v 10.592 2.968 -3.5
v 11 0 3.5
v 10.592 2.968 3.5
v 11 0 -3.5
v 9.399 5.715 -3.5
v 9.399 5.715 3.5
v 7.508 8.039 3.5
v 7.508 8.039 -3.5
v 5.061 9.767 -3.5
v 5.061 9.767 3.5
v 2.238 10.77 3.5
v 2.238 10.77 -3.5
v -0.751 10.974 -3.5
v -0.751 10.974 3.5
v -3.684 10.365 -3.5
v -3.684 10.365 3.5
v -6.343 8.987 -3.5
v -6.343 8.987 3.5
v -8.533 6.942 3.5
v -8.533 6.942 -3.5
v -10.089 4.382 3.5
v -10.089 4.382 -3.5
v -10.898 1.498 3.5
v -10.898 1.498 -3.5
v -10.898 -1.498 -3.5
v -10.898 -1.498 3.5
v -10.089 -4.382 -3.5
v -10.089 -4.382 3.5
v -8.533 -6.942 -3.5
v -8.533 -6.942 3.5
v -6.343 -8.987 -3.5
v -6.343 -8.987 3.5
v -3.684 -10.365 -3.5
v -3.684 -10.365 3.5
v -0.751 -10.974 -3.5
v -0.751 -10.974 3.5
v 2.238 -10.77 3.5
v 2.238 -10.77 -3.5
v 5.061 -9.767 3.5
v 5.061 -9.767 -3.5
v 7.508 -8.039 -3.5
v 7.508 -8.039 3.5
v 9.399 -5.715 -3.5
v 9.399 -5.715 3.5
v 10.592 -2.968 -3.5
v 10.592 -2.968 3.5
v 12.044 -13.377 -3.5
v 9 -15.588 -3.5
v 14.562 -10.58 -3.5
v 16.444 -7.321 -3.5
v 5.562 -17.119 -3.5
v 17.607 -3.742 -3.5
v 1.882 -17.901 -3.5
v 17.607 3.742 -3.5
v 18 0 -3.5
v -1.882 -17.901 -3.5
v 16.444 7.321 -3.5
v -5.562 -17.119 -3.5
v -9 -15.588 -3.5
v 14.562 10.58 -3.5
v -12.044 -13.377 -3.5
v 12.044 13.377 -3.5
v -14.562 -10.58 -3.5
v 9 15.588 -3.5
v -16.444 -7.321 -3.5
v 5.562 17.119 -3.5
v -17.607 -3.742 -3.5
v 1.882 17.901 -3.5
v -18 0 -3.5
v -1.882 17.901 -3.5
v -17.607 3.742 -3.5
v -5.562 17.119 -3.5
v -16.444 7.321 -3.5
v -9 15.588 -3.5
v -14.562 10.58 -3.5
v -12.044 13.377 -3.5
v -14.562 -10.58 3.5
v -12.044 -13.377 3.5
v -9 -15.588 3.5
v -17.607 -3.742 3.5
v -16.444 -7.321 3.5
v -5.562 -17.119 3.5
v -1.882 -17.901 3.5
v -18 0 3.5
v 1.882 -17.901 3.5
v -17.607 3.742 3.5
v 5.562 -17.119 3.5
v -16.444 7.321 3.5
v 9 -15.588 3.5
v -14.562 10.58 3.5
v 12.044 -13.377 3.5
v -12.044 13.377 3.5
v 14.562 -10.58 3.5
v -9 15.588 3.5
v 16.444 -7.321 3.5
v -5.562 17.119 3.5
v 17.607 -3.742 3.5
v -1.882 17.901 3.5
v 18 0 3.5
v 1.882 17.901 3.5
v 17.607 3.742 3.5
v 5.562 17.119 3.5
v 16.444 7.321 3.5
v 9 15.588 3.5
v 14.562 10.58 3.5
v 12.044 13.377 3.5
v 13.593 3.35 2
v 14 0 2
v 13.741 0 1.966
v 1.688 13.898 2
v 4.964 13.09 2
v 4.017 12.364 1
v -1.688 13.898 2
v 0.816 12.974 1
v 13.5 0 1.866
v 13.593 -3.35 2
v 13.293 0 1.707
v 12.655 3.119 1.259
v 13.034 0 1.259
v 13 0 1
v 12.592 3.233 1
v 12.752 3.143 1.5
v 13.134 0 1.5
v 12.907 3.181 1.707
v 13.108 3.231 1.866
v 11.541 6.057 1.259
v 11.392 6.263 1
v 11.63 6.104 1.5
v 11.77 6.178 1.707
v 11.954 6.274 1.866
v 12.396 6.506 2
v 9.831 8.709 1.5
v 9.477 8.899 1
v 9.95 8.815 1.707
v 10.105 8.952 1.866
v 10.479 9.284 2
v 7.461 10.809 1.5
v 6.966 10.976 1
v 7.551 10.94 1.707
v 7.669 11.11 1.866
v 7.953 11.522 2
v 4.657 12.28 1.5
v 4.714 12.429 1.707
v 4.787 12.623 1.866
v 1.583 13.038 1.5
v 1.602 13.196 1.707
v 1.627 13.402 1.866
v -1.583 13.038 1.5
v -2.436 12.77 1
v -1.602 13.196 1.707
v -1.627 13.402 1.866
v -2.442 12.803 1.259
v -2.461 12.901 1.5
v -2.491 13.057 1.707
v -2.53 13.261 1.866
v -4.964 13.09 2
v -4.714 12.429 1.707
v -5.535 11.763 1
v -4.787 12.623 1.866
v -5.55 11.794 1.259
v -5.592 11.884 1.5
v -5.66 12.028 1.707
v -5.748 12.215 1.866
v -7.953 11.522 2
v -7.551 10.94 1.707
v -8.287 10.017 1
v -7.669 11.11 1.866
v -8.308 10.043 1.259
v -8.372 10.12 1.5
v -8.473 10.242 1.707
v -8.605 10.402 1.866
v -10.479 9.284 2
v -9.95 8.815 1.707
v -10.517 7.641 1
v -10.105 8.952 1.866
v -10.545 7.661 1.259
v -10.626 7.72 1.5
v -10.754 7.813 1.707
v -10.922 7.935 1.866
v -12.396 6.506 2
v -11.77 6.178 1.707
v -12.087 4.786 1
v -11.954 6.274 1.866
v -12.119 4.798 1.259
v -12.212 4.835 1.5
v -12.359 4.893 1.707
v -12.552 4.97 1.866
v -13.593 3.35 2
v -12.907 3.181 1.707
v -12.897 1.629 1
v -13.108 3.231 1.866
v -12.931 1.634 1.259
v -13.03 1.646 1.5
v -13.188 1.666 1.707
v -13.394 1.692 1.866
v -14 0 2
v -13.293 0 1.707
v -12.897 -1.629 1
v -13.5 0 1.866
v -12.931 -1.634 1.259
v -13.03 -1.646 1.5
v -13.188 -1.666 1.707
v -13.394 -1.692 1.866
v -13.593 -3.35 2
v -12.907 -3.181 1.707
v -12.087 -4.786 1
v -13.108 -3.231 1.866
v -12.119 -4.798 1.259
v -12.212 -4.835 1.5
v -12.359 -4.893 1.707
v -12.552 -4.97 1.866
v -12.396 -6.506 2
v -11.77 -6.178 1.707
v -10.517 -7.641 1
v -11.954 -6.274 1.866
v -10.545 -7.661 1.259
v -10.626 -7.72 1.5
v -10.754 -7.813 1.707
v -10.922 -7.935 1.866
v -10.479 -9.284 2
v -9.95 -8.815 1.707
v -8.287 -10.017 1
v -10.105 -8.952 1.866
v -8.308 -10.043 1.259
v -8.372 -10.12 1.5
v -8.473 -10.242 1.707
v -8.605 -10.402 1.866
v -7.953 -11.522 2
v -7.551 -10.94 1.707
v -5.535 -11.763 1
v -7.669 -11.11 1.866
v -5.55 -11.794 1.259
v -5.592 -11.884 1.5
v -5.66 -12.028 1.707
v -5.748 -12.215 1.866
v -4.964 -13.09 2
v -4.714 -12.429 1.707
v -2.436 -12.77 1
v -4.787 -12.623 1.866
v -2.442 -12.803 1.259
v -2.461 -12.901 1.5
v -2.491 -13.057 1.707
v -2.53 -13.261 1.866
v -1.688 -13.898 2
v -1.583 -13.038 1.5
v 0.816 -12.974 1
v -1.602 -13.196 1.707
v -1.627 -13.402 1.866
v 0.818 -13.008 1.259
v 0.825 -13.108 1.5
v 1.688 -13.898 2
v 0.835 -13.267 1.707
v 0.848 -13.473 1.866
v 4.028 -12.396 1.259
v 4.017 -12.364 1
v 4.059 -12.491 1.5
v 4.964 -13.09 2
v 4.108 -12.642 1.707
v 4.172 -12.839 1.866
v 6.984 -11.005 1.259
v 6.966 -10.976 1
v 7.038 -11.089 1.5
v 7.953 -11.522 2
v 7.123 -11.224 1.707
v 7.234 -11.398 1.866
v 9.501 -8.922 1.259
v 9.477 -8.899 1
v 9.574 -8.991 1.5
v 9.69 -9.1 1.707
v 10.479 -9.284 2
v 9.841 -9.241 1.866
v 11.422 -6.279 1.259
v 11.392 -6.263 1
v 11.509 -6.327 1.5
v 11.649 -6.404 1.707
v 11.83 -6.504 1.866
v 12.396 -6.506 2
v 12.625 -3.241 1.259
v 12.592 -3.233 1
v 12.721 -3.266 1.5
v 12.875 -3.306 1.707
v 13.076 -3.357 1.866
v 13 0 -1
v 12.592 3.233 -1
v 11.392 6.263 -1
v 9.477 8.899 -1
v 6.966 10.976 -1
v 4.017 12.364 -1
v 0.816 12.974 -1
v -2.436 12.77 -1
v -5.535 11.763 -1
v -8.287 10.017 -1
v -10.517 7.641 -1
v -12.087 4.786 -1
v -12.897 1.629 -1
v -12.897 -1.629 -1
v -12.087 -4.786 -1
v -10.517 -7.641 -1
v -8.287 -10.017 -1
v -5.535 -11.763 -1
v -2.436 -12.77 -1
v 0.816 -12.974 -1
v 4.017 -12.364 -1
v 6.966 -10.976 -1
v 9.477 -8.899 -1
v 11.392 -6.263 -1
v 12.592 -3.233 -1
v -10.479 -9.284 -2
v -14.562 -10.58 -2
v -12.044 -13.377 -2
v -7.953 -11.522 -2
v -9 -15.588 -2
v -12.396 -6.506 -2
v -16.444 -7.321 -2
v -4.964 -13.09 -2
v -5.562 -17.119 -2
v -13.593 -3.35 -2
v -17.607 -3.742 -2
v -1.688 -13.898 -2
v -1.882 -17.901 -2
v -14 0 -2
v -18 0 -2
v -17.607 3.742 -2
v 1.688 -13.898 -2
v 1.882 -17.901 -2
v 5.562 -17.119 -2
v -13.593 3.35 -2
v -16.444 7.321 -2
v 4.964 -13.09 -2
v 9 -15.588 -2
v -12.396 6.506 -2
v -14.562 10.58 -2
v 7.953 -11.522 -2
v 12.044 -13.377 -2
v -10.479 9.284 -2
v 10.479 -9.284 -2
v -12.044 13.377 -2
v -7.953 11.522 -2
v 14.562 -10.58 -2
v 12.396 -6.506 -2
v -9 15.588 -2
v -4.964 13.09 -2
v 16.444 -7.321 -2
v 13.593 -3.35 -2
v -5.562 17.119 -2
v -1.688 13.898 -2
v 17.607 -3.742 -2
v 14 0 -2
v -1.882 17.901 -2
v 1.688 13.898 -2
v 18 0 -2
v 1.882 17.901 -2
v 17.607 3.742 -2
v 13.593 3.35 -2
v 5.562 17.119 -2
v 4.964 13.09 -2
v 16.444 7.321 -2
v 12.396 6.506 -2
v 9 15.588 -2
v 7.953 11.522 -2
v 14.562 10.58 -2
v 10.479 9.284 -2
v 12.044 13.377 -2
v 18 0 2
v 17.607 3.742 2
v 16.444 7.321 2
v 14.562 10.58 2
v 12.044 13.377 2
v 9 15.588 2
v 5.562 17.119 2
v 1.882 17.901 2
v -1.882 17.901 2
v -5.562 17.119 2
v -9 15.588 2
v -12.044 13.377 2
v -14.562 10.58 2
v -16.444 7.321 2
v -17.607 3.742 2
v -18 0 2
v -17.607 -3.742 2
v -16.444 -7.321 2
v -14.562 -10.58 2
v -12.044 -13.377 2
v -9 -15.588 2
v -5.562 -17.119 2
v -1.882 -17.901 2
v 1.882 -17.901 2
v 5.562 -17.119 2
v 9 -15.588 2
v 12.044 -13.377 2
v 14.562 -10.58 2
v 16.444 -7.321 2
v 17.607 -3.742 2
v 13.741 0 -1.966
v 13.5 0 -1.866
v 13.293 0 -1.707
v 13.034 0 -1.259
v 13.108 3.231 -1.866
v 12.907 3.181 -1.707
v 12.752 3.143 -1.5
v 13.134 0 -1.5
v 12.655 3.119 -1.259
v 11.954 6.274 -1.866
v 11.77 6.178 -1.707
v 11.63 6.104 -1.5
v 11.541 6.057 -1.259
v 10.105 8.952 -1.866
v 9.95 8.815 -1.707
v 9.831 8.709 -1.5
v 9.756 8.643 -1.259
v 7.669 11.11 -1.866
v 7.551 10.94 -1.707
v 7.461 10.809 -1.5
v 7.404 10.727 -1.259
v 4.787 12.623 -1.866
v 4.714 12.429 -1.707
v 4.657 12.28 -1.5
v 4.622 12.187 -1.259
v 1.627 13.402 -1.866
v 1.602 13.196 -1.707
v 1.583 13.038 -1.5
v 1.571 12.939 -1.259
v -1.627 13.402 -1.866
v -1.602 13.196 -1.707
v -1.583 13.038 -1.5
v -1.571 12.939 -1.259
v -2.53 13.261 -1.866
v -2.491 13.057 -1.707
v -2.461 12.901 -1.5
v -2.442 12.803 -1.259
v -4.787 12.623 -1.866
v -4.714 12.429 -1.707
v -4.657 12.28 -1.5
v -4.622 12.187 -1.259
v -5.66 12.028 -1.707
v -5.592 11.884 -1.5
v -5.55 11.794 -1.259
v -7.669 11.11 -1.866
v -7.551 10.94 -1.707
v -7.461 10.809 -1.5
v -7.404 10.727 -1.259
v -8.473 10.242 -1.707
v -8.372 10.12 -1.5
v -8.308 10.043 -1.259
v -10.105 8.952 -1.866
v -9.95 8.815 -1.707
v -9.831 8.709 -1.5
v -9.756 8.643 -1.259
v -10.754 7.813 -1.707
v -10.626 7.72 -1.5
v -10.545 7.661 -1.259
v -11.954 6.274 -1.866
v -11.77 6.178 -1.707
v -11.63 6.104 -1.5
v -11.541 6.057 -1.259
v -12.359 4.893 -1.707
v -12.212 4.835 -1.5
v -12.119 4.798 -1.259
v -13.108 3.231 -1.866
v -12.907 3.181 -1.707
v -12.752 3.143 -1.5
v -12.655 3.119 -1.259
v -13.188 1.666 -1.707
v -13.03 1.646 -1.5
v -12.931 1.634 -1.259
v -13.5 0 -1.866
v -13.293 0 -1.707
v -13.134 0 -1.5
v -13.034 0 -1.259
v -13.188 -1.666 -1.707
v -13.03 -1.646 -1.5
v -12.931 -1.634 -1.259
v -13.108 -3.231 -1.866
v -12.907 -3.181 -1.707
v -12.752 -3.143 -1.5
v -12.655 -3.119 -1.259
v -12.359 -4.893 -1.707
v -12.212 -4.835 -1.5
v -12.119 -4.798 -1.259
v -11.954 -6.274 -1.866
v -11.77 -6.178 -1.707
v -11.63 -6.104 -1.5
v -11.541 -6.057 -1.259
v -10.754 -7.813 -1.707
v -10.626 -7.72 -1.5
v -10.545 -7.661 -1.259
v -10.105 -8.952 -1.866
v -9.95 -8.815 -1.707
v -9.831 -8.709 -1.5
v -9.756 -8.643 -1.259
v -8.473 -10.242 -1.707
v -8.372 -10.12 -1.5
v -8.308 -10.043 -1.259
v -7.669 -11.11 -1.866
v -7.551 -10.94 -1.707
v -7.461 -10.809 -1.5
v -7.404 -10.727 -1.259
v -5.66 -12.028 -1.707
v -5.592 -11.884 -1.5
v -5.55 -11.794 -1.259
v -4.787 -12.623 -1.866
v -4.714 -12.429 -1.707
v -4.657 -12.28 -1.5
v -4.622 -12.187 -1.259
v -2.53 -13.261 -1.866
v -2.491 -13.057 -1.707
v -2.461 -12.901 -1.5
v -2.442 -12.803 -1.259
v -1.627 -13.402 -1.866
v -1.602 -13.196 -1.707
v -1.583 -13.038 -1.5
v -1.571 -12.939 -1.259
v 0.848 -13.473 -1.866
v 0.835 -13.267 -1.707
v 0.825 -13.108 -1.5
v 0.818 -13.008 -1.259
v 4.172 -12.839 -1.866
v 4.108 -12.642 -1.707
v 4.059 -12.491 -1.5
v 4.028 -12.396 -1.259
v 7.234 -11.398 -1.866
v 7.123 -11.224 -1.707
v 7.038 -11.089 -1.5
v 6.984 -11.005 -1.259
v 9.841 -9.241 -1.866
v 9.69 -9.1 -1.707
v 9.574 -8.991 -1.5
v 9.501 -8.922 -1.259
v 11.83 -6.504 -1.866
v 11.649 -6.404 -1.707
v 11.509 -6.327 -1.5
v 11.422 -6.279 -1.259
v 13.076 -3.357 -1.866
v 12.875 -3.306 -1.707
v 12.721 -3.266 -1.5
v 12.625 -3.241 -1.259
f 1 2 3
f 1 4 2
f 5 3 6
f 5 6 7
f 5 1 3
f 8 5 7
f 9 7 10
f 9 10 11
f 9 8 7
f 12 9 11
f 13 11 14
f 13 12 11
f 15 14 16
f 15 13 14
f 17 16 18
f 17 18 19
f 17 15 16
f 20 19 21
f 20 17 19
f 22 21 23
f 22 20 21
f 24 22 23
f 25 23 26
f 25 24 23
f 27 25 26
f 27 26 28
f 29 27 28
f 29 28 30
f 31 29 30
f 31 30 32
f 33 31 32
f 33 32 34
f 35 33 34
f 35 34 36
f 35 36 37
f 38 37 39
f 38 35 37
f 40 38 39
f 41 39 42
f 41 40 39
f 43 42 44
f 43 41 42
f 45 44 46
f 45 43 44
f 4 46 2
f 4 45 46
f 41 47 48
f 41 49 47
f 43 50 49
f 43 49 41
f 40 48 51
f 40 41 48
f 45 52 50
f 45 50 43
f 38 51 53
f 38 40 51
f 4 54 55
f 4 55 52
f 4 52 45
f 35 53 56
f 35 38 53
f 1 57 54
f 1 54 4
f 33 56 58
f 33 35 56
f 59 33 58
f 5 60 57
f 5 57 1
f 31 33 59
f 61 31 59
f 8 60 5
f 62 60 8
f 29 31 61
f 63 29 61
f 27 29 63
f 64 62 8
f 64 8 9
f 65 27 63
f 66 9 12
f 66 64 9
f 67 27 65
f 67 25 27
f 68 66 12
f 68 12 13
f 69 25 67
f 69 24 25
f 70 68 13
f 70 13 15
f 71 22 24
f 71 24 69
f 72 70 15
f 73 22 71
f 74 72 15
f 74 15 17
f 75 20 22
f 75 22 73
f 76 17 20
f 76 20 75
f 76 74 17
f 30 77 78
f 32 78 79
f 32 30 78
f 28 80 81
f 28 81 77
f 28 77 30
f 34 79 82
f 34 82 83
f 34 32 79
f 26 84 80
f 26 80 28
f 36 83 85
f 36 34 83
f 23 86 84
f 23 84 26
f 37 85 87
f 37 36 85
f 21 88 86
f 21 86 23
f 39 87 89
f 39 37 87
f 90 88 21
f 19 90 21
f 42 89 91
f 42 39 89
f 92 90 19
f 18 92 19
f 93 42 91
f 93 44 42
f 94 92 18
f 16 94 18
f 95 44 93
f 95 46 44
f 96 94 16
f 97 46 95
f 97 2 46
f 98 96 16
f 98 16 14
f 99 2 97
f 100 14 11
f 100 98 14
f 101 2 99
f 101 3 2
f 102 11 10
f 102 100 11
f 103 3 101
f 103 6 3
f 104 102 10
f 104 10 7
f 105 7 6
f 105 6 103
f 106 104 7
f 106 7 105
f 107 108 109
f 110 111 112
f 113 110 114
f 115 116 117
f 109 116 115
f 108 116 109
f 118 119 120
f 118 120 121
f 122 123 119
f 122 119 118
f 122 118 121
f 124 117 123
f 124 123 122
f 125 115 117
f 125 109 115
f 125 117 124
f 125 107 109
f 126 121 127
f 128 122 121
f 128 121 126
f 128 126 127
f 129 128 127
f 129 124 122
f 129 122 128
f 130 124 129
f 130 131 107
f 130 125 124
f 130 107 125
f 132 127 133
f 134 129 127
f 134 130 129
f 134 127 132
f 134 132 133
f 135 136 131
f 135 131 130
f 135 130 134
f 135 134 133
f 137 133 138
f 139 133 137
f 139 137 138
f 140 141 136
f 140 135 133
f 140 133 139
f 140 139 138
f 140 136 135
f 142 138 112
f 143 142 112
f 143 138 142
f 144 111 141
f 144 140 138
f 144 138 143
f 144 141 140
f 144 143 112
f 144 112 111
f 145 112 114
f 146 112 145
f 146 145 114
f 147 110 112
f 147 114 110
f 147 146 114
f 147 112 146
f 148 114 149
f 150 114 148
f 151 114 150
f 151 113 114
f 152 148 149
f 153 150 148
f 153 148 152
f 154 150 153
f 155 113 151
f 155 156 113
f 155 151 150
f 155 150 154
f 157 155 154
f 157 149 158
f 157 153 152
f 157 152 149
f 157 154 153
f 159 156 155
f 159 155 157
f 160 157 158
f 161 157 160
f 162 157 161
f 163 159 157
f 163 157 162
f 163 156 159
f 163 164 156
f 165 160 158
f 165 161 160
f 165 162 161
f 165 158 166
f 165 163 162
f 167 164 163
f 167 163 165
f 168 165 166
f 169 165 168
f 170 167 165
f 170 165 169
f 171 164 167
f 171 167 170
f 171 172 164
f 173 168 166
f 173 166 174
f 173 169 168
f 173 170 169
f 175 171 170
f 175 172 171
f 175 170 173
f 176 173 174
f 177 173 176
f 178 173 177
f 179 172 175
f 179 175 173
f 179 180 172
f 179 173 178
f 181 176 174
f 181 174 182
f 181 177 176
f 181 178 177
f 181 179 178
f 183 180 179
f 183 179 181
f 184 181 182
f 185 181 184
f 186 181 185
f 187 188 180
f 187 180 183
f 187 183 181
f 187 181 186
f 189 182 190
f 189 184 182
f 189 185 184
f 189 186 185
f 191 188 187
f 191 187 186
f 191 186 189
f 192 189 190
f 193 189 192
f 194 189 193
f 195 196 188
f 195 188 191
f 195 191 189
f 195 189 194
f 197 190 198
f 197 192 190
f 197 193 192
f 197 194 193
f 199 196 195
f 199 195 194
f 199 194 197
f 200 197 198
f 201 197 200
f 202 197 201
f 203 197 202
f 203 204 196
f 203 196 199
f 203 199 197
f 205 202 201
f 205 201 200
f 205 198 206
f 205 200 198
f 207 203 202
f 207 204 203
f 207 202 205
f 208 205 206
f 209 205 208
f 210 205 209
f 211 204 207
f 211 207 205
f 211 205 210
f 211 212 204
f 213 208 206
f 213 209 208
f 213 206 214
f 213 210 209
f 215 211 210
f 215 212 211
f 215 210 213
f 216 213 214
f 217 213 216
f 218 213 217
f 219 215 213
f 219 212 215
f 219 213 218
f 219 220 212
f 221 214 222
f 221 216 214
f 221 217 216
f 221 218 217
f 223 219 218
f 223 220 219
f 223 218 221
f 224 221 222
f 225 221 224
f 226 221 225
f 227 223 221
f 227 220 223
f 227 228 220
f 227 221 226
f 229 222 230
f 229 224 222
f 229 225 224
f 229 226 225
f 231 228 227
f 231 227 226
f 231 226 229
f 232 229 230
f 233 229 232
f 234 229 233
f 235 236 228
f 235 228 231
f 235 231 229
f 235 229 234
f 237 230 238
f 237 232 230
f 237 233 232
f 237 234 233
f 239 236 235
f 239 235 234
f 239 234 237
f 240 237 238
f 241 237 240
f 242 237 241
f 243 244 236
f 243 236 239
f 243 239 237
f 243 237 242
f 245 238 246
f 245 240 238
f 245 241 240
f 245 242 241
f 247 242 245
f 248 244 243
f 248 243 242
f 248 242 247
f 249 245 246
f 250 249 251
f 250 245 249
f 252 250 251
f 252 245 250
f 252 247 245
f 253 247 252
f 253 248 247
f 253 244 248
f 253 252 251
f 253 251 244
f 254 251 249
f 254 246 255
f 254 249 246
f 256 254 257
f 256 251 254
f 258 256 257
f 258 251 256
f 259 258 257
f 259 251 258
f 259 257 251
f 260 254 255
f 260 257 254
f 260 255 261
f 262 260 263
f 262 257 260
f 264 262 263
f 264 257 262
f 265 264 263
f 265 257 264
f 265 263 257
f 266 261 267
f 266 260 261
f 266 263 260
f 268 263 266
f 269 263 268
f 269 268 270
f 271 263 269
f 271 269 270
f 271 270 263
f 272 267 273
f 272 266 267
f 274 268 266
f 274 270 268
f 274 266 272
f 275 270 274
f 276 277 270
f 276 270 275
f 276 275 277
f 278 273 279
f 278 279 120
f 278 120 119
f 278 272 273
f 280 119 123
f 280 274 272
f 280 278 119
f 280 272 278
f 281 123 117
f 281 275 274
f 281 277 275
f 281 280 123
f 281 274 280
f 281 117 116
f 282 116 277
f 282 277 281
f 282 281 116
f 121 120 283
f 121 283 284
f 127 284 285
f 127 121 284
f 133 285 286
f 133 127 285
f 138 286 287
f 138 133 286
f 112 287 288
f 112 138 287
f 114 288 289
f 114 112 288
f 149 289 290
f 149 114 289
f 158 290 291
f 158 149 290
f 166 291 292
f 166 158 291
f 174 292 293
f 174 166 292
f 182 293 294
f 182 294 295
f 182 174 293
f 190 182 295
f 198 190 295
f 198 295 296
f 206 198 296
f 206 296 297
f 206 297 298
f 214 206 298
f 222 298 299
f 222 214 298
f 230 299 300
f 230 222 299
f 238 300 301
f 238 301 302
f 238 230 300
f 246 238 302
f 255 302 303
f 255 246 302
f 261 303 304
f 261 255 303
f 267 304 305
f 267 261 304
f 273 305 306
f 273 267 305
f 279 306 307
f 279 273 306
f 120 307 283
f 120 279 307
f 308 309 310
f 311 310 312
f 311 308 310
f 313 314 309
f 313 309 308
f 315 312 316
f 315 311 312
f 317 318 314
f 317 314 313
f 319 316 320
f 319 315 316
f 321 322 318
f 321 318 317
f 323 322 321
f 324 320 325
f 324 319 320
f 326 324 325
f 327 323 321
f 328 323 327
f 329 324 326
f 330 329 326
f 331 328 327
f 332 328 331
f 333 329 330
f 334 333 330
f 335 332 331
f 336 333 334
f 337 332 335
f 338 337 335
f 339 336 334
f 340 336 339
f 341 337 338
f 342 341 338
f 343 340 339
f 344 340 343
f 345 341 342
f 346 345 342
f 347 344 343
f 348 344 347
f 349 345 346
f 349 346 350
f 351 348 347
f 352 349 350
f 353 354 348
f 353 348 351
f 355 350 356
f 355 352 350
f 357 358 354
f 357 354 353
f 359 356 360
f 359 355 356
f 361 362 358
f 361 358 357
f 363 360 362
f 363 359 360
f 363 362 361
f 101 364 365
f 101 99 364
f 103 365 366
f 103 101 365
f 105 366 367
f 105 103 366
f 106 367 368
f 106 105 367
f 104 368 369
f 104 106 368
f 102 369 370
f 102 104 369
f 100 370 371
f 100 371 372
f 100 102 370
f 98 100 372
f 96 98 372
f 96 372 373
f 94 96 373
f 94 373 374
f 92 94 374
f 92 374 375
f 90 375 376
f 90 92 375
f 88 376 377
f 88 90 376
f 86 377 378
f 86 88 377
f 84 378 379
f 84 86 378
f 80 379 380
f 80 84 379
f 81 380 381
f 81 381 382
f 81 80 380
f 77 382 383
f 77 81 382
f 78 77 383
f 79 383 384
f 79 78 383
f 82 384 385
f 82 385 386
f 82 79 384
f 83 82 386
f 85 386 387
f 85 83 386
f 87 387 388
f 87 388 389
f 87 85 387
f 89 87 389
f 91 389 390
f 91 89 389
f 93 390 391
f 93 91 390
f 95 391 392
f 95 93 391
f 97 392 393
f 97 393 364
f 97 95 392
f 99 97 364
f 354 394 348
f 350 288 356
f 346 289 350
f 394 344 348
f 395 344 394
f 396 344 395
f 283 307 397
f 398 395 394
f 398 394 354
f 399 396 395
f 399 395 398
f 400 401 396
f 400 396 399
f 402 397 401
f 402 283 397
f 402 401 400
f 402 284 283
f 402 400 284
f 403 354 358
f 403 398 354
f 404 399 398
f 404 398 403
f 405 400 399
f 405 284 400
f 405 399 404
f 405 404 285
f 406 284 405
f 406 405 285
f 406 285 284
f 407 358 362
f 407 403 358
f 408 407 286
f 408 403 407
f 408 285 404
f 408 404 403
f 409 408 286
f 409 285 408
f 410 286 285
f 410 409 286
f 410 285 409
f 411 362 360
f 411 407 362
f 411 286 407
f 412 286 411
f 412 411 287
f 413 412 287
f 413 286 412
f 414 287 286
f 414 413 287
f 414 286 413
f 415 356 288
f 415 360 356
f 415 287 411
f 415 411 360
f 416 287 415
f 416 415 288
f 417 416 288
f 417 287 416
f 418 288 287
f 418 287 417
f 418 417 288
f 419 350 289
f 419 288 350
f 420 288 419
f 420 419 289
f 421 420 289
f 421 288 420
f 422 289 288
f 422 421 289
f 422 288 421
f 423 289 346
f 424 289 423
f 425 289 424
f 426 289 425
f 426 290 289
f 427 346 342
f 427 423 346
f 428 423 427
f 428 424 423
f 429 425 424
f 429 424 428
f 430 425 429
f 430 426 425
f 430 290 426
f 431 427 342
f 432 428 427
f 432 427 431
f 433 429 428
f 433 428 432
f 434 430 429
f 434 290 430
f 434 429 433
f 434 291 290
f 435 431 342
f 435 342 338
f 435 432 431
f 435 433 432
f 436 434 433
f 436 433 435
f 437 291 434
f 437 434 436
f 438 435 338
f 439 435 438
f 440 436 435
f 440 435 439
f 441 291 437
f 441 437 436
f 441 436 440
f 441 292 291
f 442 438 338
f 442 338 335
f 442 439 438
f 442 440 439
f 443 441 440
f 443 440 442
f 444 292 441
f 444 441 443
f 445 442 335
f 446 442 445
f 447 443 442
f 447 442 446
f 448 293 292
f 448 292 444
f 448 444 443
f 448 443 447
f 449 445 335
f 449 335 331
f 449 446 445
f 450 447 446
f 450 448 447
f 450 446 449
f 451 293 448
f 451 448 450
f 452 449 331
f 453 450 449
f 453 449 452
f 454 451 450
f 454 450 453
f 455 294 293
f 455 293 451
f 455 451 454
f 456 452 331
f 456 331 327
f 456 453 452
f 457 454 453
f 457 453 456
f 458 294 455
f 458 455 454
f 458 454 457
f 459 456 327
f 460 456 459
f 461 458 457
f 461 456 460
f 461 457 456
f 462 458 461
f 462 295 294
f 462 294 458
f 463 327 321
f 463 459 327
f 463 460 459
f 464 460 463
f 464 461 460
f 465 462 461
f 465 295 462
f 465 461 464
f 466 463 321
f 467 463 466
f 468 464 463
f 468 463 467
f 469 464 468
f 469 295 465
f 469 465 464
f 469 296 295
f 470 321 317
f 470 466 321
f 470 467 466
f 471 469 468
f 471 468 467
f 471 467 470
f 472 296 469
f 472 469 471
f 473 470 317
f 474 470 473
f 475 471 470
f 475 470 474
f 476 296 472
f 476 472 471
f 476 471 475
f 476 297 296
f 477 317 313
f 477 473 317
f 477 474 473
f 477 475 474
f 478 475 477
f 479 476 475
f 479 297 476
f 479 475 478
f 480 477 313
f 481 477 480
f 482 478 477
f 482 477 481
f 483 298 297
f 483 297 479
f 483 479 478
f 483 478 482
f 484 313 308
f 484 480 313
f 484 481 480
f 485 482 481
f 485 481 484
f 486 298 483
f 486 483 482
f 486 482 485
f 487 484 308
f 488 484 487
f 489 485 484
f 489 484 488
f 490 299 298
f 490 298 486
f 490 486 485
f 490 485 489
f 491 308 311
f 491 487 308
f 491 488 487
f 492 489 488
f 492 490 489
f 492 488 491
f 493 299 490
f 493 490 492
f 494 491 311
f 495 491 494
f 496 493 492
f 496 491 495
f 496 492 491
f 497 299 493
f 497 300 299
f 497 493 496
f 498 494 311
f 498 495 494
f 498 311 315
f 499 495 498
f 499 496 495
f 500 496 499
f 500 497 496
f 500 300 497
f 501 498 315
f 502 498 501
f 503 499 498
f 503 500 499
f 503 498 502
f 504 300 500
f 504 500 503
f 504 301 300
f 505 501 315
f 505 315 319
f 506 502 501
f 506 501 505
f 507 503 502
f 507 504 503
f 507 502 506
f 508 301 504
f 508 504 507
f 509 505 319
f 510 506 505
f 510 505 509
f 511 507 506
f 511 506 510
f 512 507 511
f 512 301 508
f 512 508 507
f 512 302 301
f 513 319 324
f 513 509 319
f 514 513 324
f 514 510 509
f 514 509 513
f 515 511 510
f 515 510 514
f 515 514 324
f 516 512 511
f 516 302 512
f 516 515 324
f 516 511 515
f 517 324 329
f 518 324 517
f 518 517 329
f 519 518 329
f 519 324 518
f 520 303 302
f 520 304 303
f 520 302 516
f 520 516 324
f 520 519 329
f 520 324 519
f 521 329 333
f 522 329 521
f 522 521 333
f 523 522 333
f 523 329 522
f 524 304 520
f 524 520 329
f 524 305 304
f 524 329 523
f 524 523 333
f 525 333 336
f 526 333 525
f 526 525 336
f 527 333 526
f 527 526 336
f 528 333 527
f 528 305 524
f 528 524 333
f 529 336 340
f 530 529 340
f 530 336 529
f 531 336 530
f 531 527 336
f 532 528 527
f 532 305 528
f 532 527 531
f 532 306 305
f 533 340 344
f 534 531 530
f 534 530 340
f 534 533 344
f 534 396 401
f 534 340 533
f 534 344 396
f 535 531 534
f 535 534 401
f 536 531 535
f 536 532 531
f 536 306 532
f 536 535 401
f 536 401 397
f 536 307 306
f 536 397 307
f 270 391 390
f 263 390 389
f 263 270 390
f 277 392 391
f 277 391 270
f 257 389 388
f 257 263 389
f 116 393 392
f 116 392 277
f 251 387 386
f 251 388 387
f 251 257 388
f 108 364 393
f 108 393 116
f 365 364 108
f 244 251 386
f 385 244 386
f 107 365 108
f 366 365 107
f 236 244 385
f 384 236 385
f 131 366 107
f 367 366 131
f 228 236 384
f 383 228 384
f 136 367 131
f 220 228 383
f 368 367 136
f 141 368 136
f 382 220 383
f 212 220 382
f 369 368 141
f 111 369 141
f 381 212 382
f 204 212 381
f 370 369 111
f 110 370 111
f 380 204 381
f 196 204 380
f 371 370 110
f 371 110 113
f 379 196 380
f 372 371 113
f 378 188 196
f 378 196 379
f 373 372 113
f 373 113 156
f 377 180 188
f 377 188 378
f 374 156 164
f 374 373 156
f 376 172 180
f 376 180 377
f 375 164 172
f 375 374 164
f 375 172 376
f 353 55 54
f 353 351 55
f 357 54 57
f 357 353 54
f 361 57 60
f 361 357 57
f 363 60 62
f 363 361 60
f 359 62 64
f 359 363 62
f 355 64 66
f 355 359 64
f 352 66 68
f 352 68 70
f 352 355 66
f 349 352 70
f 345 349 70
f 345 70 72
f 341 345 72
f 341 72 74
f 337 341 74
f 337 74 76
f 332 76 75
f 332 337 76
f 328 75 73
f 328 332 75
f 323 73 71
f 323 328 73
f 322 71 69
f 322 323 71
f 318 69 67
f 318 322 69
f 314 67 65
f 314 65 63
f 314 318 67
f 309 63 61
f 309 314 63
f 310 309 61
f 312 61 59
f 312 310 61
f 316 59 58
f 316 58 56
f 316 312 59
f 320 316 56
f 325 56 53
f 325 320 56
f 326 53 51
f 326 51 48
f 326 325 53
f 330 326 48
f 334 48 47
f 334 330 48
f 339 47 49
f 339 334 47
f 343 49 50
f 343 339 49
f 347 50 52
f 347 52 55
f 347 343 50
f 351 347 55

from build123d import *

# Parameters (mm, degrees)
F2_R = 1


with BuildPart() as f1:
    # F0 (on Front) → F1 (revolve)
    with BuildSketch(Plane.XZ):
        Polygon((18, 3.5), (11, 3.5), (11, 0), (11, -3.5), (18, -3.5), (18, -2), (13, -2), (13, 0), (13, 2), (18, 2), align=None)
    revolve(axis=Axis((0, 0, 1.75), (0, 0, 1)))

    # F2
    f2_edges = [f1.edges().sort_by_distance(p)[0] for p in [
        (-13, 0, -2),
        (13, 0, 0),
        (-13, 0, 2),
    ]]
    fillet(f2_edges, radius=F2_R)


solid = f1.part
